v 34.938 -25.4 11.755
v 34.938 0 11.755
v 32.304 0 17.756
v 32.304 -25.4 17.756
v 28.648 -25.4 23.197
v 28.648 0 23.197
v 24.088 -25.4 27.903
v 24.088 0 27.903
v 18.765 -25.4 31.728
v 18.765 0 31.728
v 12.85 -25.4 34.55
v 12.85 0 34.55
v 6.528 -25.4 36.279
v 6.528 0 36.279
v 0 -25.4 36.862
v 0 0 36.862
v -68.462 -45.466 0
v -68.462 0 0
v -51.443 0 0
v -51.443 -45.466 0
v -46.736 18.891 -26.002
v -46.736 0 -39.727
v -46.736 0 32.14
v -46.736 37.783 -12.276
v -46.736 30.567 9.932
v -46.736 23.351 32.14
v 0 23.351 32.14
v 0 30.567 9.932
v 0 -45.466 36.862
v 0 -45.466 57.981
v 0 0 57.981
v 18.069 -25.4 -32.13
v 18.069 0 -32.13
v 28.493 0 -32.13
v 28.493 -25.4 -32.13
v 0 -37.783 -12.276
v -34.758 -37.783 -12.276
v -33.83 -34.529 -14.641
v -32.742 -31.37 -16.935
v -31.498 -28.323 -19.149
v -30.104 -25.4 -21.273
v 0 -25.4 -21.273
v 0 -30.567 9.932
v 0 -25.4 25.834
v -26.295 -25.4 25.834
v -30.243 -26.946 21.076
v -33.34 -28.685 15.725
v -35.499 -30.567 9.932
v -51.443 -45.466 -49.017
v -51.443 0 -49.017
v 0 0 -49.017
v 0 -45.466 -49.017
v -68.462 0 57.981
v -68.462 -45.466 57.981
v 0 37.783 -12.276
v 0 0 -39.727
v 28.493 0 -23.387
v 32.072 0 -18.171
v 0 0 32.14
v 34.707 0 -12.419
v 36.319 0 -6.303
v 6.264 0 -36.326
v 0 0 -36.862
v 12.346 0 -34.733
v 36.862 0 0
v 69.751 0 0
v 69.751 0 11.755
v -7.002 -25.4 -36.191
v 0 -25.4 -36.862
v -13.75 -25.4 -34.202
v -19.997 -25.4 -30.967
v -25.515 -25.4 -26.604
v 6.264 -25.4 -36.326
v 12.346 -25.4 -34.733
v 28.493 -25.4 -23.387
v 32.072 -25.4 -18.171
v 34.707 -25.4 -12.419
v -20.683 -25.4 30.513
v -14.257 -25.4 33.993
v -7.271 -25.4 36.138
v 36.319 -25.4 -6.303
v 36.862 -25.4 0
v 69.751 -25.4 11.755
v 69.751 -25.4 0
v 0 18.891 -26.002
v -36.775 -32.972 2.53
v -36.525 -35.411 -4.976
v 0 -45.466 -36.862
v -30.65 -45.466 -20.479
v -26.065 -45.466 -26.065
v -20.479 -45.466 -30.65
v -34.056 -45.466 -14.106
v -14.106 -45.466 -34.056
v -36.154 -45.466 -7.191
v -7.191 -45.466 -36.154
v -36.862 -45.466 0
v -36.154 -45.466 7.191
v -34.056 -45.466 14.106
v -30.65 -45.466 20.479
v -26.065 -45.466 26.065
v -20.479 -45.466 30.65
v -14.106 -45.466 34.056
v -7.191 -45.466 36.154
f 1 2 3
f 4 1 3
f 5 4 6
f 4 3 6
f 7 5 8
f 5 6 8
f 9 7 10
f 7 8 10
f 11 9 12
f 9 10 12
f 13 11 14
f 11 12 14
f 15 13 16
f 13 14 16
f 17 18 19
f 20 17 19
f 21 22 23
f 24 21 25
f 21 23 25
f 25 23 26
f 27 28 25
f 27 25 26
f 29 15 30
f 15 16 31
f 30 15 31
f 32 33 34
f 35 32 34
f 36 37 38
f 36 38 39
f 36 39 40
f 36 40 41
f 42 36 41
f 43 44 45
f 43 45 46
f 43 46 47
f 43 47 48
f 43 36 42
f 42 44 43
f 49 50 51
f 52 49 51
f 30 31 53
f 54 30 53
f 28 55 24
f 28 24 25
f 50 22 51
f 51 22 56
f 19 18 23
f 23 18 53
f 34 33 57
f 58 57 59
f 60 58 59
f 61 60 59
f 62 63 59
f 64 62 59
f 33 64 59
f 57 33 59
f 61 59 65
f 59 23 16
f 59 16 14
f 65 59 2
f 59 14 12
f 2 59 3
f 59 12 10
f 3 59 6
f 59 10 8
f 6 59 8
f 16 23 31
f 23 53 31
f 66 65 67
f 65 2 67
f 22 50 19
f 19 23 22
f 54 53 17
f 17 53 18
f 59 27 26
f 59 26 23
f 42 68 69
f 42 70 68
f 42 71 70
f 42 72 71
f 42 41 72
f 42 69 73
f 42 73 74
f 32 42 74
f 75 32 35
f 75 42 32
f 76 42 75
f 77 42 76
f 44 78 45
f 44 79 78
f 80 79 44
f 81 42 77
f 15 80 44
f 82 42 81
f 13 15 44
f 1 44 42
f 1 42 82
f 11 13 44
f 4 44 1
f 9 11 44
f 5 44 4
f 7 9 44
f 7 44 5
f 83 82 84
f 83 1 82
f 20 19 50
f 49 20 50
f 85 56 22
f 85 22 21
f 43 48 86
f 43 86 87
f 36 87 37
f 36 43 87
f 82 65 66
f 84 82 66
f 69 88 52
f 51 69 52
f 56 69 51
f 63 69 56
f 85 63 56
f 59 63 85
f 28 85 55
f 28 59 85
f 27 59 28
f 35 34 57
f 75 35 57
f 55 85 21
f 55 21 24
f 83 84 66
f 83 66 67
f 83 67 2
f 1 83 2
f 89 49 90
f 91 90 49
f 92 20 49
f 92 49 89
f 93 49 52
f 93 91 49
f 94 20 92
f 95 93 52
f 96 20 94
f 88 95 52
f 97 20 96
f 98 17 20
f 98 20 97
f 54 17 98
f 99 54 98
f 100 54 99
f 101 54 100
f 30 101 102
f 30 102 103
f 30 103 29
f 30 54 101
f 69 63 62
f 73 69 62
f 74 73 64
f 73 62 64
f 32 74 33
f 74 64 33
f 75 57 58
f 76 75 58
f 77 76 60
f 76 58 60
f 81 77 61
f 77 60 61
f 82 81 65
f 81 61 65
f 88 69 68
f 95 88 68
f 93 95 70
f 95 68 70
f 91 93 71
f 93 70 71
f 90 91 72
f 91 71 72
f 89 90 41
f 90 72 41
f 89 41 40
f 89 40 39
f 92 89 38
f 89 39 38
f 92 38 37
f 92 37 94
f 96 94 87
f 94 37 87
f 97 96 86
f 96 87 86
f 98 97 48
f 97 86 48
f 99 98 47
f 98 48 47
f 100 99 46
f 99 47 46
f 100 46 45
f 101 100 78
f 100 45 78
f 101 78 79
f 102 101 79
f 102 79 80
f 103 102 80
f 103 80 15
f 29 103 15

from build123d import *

# Parameters (mm, degrees)
F1_DEPTH = 45.466
F2_DEPTH = 25.4
F4_DEPTH = 46.736


with BuildPart() as f1:
    # F0 (on Front) → F1 (new body)
    with BuildSketch(Plane.XZ):
        with BuildLine():
            ThreePointArc((-36.8620457054, 0), (-26.0654024867, 26.0654024867), (0, 36.8620457054))
            Line((0, 36.8620457054), (0, 57.9813979566))
            Line((0, 57.9813979566), (-68.4616416693, 57.9813979566))
            Line((-68.4616416693, 57.9813979566), (-68.4616416693, 0))
            Line((-68.4616416693, 0), (-51.4429248869, 0))
            Line((-51.4429248869, 0), (-36.8620457054, 0))
        make_face()
        with BuildLine():
            ThreePointArc((0, -36.8620457054), (-26.0654024867, -26.0654024867), (-36.8620457054, 0))
            Line((-36.8620457054, 0), (-51.4429248869, 0))
            Line((-51.4429248869, 0), (-51.4429248869, -49.0166470408))
            Line((-51.4429248869, -49.0166470408), (0, -49.0166470408))
            Line((0, -49.0166470408), (0, -36.8620457054))
        make_face()
    extrude(amount=F1_DEPTH)

    # F0 (on Front) → F2 (join)
    with BuildSketch(Plane.XZ):
        with BuildLine():
            Line((28.4934528172, 0), (36.8620457054, 0))
            ThreePointArc((36.8620457054, 0), (36.3777391302, 5.9557123304), (34.9375453863, 11.7549281567))
            Line((34.9375453863, 11.7549281567), (0, 11.7549281567))
            Line((0, 11.7549281567), (0, 0))
            Line((0, 0), (28.4934528172, 0))
        make_face()
        with BuildLine():
            ThreePointArc((28.4934528172, -23.3866107023), (34.7068968192, -12.4194092761), (36.8620457054, 0))
            Line((36.8620457054, 0), (28.4934528172, 0))
            Line((28.4934528172, 0), (28.4934528172, -23.3866107023))
        make_face()
        with BuildLine():
            ThreePointArc((34.9375453863, 11.7549281567), (36.3777391302, 5.9557123304), (36.8620457054, 0))
            Line((36.8620457054, 0), (69.7509273887, 0))
            Line((69.7509273887, 0), (69.7509273887, 11.7549281567))
            Line((69.7509273887, 11.7549281567), (34.9375453863, 11.7549281567))
        make_face()
        with BuildLine():
            Line((0, 11.7549281567), (34.9375453863, 11.7549281567))
            ThreePointArc((34.9375453863, 11.7549281567), (21.5116214476, 29.9342705988), (0, 36.8620457054))
            Line((0, 36.8620457054), (0, 11.7549281567))
        make_face()
        with BuildLine():
            Line((28.4934528172, -32.1296229959), (28.4934528172, -23.3866107023))
            ThreePointArc((28.4934528172, -23.3866107023), (23.6882112756, -28.2432126387), (18.0692484551, -32.1296229959))
            Line((18.0692484551, -32.1296229959), (28.4934528172, -32.1296229959))
        make_face()
        with BuildLine():
            ThreePointArc((18.0692484551, -32.1296229959), (23.6882112756, -28.2432126387), (28.4934528172, -23.3866107023))
            Line((28.4934528172, -23.3866107023), (28.4934528172, 0))
            Line((28.4934528172, 0), (0, 0))
            Line((0, 0), (0, -32.1296229959))
            Line((0, -32.1296229959), (18.0692484551, -32.1296229959))
        make_face()
        with BuildLine():
            Line((0, 11.7549281567), (0, 36.8620457054))
            ThreePointArc((0, 36.8620457054), (-26.0654024867, 26.0654024867), (-36.8620457054, 0))
            Line((-36.8620457054, 0), (0, 0))
            Line((0, 0), (0, 11.7549281567))
        make_face()
        with BuildLine():
            ThreePointArc((-36.8620457054, 0), (-26.0654024867, 26.0654024867), (0, 36.8620457054))
            Line((0, 36.8620457054), (0, 57.9813979566))
            Line((0, 57.9813979566), (-68.4616416693, 57.9813979566))
            Line((-68.4616416693, 57.9813979566), (-68.4616416693, 0))
            Line((-68.4616416693, 0), (-51.4429248869, 0))
            Line((-51.4429248869, 0), (-36.8620457054, 0))
        make_face()
        with BuildLine():
            ThreePointArc((0, -36.8620457054), (9.3393463962, -35.6593188729), (18.0692484551, -32.1296229959))
            Line((18.0692484551, -32.1296229959), (0, -32.1296229959))
            Line((0, -32.1296229959), (0, -36.8620457054))
        make_face()
        with BuildLine():
            Line((0, -32.1296229959), (0, 0))
            Line((0, 0), (-36.8620457054, 0))
            ThreePointArc((-36.8620457054, 0), (-26.0654024867, -26.0654024867), (0, -36.8620457054))
            Line((0, -36.8620457054), (0, -32.1296229959))
        make_face()
        with BuildLine():
            ThreePointArc((0, -36.8620457054), (-26.0654024867, -26.0654024867), (-36.8620457054, 0))
            Line((-36.8620457054, 0), (-51.4429248869, 0))
            Line((-51.4429248869, 0), (-51.4429248869, -49.0166470408))
            Line((-51.4429248869, -49.0166470408), (0, -49.0166470408))
            Line((0, -49.0166470408), (0, -36.8620457054))
        make_face()
    extrude(amount=F2_DEPTH)

    # F3 (on Right) → F4 (join)
    with BuildSketch(Plane.YZ):
        with BuildLine():
            ThreePointArc((18.8913277671, -26.0016833187), (28.6368136719, -14.5911857958), (32.1398475449, 0))
            ThreePointArc((32.1398475449, 0), (31.7441526763, 5.0277799349), (30.5668113916, 9.9317592377))
            ThreePointArc((30.5668113916, 9.9317592377), (18.8913283341, 26.0016829067), (0, 32.1398475449))
            ThreePointArc((0, 32.1398475449), (-18.8913281553, 26.0016830366), (-30.566811255, 9.9317596581))
            ThreePointArc((-30.566811255, 9.9317596581), (-30.5668114341, -9.9317591071), (-18.8913278804, -26.0016832363))
            ThreePointArc((-18.8913278804, -26.0016832363), (-7e-08, -32.1398475449), (18.8913277671, -26.0016833187))
        make_face()
        with BuildLine():
            ThreePointArc((30.5668113916, 9.9317592377), (31.7441526763, 5.0277799349), (32.1398475449, 0))
            ThreePointArc((32.1398475449, 0), (28.6368136719, -14.5911857958), (18.8913277671, -26.0016833187))
            Line((18.8913277671, -26.0016833187), (37.7826567956, -12.2763293689))
            Line((37.7826567956, -12.2763293689), (30.5668113916, 9.9317592377))
        make_face()
        with BuildLine():
            ThreePointArc((0, 32.1398475449), (18.8913283341, 26.0016829067), (30.5668113916, 9.9317592377))
            Line((30.5668113916, 9.9317592377), (23.350966085, 32.1398475449))
            Line((23.350966085, 32.1398475449), (0, 32.1398475449))
        make_face()
        with BuildLine():
            Line((0, -39.7270363519), (18.8913277671, -26.0016833187))
            ThreePointArc((18.8913277671, -26.0016833187), (-7e-08, -32.1398475449), (-18.8913278804, -26.0016832363))
            Line((-18.8913278804, -26.0016832363), (0, -39.7270363519))
        make_face()
        with BuildLine():
            ThreePointArc((-30.566811255, 9.9317596581), (-18.8913281553, 26.0016830366), (0, 32.1398475449))
            Line((0, 32.1398475449), (-23.350966085, 32.1398475449))
            Line((-23.350966085, 32.1398475449), (-30.566811255, 9.9317596581))
        make_face()
        with BuildLine():
            Line((-37.7826567956, -12.2763293689), (-18.8913278804, -26.0016832363))
            ThreePointArc((-18.8913278804, -26.0016832363), (-30.5668114341, -9.9317591071), (-30.566811255, 9.9317596581))
            Line((-30.566811255, 9.9317596581), (-37.7826567956, -12.2763293689))
        make_face()
    extrude(amount=-F4_DEPTH)


solid = f1.part
